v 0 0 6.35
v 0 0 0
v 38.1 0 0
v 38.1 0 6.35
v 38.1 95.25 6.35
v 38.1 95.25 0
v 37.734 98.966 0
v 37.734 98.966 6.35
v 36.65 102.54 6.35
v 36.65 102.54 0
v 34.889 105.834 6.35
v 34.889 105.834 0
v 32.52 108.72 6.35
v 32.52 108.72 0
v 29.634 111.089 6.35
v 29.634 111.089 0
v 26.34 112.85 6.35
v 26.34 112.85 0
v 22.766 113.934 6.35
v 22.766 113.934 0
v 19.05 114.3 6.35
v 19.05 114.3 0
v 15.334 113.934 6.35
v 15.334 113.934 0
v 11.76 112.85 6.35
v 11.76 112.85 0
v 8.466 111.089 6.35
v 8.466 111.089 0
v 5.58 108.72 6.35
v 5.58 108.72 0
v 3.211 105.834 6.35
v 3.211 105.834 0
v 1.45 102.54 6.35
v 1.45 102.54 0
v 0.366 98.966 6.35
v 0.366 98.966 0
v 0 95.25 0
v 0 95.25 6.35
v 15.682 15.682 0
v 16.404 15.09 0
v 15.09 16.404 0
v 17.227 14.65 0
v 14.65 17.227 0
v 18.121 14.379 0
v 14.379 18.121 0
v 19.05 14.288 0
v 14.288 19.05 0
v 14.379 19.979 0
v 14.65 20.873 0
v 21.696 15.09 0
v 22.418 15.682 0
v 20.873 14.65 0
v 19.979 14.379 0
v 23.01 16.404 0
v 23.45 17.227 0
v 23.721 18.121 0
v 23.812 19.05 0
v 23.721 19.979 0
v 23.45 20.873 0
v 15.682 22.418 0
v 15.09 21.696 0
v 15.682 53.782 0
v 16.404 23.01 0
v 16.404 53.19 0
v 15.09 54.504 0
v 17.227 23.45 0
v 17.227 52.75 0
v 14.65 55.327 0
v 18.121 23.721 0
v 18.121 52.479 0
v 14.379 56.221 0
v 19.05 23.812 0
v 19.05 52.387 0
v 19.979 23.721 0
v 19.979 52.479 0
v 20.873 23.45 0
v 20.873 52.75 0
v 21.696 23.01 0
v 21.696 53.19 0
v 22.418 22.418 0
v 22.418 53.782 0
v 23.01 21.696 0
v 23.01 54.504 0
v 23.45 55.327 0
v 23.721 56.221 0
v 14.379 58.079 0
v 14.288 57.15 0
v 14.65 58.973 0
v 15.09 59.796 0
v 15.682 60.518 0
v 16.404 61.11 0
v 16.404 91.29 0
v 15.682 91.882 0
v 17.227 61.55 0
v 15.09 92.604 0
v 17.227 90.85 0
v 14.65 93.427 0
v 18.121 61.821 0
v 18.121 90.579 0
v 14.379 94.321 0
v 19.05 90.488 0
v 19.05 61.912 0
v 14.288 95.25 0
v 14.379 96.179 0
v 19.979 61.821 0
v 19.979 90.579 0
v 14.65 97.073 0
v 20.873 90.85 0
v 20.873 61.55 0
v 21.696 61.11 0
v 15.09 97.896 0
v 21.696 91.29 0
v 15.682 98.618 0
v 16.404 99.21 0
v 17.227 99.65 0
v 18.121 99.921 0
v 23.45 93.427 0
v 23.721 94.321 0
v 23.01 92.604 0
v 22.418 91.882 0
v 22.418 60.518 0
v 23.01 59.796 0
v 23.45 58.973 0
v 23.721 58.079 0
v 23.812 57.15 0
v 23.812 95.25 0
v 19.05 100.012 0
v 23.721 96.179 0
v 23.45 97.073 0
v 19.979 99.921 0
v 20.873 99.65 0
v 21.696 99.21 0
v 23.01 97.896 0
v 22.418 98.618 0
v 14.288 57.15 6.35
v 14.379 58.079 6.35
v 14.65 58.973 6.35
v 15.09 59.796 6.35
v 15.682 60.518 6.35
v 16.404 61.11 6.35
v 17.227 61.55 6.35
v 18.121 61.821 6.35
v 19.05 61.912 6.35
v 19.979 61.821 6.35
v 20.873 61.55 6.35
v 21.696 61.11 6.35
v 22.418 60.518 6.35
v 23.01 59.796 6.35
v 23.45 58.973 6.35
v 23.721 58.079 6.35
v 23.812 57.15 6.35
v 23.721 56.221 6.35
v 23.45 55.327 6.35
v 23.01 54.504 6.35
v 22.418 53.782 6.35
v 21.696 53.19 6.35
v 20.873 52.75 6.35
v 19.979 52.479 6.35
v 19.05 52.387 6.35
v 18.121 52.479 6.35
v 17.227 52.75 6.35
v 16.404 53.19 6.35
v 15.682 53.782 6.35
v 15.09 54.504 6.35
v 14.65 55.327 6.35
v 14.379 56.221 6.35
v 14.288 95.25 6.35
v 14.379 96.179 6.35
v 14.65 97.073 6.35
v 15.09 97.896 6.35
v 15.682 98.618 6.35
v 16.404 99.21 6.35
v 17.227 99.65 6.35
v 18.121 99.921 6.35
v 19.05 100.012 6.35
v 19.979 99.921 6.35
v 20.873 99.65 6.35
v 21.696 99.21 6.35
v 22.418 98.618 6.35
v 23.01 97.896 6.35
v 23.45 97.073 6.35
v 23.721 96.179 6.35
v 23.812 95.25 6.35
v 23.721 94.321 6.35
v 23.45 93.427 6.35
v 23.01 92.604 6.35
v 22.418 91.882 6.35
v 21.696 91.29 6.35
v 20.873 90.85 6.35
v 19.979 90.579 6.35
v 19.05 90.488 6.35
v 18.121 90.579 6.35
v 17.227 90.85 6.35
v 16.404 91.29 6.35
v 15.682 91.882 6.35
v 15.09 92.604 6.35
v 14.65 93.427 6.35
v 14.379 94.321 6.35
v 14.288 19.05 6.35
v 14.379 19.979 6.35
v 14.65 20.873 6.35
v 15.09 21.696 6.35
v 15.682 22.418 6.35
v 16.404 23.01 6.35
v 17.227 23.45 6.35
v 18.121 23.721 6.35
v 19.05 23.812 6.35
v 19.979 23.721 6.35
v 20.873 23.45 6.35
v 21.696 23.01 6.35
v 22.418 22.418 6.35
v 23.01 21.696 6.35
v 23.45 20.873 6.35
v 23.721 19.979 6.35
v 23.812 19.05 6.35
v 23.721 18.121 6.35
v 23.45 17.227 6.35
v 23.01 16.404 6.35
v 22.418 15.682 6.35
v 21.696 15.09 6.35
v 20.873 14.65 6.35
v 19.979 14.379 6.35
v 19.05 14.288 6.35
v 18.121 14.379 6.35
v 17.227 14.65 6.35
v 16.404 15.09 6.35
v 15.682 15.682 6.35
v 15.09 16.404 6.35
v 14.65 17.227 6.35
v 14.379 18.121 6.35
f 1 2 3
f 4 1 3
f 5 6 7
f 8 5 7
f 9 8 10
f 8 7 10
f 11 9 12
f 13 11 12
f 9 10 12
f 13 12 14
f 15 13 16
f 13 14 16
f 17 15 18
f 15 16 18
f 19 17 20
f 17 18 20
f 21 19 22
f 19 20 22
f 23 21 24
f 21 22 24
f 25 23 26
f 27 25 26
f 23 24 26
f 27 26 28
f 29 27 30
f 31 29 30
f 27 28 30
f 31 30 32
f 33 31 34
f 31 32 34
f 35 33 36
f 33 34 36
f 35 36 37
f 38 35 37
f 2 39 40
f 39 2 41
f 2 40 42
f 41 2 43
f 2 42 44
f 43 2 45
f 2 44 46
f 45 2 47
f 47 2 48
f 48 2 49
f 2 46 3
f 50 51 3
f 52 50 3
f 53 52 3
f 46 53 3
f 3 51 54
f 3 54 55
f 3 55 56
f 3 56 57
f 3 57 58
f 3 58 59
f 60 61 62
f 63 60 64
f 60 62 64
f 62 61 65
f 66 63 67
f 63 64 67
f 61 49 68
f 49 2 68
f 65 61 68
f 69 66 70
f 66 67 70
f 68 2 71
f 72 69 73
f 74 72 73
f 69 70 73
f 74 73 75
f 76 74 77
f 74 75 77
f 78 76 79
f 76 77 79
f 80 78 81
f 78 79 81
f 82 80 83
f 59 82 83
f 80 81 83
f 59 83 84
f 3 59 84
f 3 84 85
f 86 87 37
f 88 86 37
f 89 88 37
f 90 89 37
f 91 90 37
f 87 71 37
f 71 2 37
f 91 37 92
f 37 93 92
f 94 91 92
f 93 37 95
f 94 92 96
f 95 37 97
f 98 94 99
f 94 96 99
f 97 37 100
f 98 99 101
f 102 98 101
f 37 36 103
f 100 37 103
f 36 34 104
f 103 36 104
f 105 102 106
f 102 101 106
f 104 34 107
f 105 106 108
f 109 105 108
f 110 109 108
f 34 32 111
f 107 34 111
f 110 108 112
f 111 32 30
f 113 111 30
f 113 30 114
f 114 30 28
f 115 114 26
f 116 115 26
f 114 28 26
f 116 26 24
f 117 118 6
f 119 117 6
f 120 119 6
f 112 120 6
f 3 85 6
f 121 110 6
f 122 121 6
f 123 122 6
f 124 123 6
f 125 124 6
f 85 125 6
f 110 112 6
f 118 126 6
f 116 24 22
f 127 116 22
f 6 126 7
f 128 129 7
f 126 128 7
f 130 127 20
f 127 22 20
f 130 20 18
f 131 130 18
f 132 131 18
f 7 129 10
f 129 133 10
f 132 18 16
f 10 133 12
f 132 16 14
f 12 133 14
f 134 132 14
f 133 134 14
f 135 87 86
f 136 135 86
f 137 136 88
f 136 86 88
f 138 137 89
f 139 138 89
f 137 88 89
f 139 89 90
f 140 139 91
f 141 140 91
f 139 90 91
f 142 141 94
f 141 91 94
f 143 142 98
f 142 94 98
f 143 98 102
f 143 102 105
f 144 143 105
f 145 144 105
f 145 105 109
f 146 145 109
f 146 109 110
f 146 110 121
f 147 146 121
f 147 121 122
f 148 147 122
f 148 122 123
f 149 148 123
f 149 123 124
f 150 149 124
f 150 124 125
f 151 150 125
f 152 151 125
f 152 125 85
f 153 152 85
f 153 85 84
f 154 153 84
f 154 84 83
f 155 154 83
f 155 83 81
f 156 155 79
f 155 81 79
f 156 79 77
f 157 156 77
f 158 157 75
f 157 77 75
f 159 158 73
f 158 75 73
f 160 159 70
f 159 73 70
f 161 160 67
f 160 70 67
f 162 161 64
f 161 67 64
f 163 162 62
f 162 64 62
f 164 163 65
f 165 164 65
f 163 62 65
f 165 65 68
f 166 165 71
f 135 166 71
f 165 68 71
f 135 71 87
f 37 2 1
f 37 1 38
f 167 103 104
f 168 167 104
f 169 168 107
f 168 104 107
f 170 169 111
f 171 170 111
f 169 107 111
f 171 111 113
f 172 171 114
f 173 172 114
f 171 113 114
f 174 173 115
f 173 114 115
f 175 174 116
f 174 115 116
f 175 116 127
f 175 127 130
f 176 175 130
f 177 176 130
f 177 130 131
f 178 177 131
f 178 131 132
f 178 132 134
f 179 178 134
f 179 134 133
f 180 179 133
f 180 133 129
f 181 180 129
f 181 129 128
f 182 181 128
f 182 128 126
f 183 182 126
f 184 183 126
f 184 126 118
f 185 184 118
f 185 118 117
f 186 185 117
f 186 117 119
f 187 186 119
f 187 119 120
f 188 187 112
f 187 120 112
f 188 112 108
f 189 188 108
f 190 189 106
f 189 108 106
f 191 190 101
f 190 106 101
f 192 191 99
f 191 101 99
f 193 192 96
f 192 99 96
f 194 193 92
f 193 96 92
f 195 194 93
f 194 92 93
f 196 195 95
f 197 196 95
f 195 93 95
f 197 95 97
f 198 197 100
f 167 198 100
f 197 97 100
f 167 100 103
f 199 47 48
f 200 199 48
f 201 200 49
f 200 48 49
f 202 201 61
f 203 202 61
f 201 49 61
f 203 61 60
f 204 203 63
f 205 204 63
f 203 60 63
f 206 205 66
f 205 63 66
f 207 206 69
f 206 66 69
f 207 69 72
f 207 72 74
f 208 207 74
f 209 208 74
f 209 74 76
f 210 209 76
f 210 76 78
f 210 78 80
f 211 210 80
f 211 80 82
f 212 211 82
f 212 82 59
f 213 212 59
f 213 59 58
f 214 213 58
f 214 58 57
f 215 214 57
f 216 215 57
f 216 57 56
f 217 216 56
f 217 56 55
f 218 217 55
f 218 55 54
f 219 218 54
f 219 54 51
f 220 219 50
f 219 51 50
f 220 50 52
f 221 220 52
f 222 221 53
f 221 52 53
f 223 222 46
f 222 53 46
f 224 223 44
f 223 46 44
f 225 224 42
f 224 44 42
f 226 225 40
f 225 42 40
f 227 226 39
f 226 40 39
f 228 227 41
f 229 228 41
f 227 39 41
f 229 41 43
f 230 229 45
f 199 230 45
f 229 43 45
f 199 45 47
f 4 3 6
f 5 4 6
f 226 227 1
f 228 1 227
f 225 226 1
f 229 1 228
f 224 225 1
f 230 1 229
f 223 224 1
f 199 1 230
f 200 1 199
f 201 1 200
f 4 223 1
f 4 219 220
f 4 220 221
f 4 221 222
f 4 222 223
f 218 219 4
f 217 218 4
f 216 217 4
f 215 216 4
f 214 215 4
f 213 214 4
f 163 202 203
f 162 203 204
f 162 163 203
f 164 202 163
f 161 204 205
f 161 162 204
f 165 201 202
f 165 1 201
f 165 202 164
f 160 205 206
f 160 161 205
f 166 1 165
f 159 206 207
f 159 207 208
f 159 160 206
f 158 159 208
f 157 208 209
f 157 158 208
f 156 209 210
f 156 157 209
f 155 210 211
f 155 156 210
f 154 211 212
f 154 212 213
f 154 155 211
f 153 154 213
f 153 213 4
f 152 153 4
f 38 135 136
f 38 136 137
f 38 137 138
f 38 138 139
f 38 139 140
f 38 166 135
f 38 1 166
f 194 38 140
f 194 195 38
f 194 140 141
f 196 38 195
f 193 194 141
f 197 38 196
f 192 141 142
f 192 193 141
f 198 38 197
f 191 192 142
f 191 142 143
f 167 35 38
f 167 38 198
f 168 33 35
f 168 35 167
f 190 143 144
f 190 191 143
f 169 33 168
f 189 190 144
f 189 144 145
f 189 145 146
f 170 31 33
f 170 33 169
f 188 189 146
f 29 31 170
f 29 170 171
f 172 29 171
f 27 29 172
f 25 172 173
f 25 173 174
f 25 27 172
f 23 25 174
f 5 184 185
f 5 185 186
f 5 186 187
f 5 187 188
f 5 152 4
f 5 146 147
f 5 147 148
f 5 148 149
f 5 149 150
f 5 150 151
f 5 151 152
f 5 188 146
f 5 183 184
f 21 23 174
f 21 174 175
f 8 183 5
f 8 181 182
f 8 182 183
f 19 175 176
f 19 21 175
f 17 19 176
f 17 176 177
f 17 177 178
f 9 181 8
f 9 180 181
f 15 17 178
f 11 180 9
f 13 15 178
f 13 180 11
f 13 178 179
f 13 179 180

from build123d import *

# Parameters (mm, degrees)
F0_W     = 38.1
F0_H     = 95.25
F1_DEPTH = 6.35
F3_D     = 9.525


with BuildPart() as f1:
    # F0 (on Top) → F1 (new body)
    with BuildSketch(Plane.XY):
        with Locations((19.05, 47.625)):
            Rectangle(F0_W, F0_H)
        with BuildLine():
            ThreePointArc((38.1, 95.25), (19.05, 114.3), (0, 95.25))
            Line((0, 95.25), (38.1, 95.25))
        make_face()
    extrude(amount=F1_DEPTH)

    # F3 (through all)
    with Locations(Plane.XY.offset(6.35)):
        with Locations((19.05, 95.25), (19.05, 57.15), (19.05, 19.05)):
            Hole(F3_D / 2)


solid = f1.part
